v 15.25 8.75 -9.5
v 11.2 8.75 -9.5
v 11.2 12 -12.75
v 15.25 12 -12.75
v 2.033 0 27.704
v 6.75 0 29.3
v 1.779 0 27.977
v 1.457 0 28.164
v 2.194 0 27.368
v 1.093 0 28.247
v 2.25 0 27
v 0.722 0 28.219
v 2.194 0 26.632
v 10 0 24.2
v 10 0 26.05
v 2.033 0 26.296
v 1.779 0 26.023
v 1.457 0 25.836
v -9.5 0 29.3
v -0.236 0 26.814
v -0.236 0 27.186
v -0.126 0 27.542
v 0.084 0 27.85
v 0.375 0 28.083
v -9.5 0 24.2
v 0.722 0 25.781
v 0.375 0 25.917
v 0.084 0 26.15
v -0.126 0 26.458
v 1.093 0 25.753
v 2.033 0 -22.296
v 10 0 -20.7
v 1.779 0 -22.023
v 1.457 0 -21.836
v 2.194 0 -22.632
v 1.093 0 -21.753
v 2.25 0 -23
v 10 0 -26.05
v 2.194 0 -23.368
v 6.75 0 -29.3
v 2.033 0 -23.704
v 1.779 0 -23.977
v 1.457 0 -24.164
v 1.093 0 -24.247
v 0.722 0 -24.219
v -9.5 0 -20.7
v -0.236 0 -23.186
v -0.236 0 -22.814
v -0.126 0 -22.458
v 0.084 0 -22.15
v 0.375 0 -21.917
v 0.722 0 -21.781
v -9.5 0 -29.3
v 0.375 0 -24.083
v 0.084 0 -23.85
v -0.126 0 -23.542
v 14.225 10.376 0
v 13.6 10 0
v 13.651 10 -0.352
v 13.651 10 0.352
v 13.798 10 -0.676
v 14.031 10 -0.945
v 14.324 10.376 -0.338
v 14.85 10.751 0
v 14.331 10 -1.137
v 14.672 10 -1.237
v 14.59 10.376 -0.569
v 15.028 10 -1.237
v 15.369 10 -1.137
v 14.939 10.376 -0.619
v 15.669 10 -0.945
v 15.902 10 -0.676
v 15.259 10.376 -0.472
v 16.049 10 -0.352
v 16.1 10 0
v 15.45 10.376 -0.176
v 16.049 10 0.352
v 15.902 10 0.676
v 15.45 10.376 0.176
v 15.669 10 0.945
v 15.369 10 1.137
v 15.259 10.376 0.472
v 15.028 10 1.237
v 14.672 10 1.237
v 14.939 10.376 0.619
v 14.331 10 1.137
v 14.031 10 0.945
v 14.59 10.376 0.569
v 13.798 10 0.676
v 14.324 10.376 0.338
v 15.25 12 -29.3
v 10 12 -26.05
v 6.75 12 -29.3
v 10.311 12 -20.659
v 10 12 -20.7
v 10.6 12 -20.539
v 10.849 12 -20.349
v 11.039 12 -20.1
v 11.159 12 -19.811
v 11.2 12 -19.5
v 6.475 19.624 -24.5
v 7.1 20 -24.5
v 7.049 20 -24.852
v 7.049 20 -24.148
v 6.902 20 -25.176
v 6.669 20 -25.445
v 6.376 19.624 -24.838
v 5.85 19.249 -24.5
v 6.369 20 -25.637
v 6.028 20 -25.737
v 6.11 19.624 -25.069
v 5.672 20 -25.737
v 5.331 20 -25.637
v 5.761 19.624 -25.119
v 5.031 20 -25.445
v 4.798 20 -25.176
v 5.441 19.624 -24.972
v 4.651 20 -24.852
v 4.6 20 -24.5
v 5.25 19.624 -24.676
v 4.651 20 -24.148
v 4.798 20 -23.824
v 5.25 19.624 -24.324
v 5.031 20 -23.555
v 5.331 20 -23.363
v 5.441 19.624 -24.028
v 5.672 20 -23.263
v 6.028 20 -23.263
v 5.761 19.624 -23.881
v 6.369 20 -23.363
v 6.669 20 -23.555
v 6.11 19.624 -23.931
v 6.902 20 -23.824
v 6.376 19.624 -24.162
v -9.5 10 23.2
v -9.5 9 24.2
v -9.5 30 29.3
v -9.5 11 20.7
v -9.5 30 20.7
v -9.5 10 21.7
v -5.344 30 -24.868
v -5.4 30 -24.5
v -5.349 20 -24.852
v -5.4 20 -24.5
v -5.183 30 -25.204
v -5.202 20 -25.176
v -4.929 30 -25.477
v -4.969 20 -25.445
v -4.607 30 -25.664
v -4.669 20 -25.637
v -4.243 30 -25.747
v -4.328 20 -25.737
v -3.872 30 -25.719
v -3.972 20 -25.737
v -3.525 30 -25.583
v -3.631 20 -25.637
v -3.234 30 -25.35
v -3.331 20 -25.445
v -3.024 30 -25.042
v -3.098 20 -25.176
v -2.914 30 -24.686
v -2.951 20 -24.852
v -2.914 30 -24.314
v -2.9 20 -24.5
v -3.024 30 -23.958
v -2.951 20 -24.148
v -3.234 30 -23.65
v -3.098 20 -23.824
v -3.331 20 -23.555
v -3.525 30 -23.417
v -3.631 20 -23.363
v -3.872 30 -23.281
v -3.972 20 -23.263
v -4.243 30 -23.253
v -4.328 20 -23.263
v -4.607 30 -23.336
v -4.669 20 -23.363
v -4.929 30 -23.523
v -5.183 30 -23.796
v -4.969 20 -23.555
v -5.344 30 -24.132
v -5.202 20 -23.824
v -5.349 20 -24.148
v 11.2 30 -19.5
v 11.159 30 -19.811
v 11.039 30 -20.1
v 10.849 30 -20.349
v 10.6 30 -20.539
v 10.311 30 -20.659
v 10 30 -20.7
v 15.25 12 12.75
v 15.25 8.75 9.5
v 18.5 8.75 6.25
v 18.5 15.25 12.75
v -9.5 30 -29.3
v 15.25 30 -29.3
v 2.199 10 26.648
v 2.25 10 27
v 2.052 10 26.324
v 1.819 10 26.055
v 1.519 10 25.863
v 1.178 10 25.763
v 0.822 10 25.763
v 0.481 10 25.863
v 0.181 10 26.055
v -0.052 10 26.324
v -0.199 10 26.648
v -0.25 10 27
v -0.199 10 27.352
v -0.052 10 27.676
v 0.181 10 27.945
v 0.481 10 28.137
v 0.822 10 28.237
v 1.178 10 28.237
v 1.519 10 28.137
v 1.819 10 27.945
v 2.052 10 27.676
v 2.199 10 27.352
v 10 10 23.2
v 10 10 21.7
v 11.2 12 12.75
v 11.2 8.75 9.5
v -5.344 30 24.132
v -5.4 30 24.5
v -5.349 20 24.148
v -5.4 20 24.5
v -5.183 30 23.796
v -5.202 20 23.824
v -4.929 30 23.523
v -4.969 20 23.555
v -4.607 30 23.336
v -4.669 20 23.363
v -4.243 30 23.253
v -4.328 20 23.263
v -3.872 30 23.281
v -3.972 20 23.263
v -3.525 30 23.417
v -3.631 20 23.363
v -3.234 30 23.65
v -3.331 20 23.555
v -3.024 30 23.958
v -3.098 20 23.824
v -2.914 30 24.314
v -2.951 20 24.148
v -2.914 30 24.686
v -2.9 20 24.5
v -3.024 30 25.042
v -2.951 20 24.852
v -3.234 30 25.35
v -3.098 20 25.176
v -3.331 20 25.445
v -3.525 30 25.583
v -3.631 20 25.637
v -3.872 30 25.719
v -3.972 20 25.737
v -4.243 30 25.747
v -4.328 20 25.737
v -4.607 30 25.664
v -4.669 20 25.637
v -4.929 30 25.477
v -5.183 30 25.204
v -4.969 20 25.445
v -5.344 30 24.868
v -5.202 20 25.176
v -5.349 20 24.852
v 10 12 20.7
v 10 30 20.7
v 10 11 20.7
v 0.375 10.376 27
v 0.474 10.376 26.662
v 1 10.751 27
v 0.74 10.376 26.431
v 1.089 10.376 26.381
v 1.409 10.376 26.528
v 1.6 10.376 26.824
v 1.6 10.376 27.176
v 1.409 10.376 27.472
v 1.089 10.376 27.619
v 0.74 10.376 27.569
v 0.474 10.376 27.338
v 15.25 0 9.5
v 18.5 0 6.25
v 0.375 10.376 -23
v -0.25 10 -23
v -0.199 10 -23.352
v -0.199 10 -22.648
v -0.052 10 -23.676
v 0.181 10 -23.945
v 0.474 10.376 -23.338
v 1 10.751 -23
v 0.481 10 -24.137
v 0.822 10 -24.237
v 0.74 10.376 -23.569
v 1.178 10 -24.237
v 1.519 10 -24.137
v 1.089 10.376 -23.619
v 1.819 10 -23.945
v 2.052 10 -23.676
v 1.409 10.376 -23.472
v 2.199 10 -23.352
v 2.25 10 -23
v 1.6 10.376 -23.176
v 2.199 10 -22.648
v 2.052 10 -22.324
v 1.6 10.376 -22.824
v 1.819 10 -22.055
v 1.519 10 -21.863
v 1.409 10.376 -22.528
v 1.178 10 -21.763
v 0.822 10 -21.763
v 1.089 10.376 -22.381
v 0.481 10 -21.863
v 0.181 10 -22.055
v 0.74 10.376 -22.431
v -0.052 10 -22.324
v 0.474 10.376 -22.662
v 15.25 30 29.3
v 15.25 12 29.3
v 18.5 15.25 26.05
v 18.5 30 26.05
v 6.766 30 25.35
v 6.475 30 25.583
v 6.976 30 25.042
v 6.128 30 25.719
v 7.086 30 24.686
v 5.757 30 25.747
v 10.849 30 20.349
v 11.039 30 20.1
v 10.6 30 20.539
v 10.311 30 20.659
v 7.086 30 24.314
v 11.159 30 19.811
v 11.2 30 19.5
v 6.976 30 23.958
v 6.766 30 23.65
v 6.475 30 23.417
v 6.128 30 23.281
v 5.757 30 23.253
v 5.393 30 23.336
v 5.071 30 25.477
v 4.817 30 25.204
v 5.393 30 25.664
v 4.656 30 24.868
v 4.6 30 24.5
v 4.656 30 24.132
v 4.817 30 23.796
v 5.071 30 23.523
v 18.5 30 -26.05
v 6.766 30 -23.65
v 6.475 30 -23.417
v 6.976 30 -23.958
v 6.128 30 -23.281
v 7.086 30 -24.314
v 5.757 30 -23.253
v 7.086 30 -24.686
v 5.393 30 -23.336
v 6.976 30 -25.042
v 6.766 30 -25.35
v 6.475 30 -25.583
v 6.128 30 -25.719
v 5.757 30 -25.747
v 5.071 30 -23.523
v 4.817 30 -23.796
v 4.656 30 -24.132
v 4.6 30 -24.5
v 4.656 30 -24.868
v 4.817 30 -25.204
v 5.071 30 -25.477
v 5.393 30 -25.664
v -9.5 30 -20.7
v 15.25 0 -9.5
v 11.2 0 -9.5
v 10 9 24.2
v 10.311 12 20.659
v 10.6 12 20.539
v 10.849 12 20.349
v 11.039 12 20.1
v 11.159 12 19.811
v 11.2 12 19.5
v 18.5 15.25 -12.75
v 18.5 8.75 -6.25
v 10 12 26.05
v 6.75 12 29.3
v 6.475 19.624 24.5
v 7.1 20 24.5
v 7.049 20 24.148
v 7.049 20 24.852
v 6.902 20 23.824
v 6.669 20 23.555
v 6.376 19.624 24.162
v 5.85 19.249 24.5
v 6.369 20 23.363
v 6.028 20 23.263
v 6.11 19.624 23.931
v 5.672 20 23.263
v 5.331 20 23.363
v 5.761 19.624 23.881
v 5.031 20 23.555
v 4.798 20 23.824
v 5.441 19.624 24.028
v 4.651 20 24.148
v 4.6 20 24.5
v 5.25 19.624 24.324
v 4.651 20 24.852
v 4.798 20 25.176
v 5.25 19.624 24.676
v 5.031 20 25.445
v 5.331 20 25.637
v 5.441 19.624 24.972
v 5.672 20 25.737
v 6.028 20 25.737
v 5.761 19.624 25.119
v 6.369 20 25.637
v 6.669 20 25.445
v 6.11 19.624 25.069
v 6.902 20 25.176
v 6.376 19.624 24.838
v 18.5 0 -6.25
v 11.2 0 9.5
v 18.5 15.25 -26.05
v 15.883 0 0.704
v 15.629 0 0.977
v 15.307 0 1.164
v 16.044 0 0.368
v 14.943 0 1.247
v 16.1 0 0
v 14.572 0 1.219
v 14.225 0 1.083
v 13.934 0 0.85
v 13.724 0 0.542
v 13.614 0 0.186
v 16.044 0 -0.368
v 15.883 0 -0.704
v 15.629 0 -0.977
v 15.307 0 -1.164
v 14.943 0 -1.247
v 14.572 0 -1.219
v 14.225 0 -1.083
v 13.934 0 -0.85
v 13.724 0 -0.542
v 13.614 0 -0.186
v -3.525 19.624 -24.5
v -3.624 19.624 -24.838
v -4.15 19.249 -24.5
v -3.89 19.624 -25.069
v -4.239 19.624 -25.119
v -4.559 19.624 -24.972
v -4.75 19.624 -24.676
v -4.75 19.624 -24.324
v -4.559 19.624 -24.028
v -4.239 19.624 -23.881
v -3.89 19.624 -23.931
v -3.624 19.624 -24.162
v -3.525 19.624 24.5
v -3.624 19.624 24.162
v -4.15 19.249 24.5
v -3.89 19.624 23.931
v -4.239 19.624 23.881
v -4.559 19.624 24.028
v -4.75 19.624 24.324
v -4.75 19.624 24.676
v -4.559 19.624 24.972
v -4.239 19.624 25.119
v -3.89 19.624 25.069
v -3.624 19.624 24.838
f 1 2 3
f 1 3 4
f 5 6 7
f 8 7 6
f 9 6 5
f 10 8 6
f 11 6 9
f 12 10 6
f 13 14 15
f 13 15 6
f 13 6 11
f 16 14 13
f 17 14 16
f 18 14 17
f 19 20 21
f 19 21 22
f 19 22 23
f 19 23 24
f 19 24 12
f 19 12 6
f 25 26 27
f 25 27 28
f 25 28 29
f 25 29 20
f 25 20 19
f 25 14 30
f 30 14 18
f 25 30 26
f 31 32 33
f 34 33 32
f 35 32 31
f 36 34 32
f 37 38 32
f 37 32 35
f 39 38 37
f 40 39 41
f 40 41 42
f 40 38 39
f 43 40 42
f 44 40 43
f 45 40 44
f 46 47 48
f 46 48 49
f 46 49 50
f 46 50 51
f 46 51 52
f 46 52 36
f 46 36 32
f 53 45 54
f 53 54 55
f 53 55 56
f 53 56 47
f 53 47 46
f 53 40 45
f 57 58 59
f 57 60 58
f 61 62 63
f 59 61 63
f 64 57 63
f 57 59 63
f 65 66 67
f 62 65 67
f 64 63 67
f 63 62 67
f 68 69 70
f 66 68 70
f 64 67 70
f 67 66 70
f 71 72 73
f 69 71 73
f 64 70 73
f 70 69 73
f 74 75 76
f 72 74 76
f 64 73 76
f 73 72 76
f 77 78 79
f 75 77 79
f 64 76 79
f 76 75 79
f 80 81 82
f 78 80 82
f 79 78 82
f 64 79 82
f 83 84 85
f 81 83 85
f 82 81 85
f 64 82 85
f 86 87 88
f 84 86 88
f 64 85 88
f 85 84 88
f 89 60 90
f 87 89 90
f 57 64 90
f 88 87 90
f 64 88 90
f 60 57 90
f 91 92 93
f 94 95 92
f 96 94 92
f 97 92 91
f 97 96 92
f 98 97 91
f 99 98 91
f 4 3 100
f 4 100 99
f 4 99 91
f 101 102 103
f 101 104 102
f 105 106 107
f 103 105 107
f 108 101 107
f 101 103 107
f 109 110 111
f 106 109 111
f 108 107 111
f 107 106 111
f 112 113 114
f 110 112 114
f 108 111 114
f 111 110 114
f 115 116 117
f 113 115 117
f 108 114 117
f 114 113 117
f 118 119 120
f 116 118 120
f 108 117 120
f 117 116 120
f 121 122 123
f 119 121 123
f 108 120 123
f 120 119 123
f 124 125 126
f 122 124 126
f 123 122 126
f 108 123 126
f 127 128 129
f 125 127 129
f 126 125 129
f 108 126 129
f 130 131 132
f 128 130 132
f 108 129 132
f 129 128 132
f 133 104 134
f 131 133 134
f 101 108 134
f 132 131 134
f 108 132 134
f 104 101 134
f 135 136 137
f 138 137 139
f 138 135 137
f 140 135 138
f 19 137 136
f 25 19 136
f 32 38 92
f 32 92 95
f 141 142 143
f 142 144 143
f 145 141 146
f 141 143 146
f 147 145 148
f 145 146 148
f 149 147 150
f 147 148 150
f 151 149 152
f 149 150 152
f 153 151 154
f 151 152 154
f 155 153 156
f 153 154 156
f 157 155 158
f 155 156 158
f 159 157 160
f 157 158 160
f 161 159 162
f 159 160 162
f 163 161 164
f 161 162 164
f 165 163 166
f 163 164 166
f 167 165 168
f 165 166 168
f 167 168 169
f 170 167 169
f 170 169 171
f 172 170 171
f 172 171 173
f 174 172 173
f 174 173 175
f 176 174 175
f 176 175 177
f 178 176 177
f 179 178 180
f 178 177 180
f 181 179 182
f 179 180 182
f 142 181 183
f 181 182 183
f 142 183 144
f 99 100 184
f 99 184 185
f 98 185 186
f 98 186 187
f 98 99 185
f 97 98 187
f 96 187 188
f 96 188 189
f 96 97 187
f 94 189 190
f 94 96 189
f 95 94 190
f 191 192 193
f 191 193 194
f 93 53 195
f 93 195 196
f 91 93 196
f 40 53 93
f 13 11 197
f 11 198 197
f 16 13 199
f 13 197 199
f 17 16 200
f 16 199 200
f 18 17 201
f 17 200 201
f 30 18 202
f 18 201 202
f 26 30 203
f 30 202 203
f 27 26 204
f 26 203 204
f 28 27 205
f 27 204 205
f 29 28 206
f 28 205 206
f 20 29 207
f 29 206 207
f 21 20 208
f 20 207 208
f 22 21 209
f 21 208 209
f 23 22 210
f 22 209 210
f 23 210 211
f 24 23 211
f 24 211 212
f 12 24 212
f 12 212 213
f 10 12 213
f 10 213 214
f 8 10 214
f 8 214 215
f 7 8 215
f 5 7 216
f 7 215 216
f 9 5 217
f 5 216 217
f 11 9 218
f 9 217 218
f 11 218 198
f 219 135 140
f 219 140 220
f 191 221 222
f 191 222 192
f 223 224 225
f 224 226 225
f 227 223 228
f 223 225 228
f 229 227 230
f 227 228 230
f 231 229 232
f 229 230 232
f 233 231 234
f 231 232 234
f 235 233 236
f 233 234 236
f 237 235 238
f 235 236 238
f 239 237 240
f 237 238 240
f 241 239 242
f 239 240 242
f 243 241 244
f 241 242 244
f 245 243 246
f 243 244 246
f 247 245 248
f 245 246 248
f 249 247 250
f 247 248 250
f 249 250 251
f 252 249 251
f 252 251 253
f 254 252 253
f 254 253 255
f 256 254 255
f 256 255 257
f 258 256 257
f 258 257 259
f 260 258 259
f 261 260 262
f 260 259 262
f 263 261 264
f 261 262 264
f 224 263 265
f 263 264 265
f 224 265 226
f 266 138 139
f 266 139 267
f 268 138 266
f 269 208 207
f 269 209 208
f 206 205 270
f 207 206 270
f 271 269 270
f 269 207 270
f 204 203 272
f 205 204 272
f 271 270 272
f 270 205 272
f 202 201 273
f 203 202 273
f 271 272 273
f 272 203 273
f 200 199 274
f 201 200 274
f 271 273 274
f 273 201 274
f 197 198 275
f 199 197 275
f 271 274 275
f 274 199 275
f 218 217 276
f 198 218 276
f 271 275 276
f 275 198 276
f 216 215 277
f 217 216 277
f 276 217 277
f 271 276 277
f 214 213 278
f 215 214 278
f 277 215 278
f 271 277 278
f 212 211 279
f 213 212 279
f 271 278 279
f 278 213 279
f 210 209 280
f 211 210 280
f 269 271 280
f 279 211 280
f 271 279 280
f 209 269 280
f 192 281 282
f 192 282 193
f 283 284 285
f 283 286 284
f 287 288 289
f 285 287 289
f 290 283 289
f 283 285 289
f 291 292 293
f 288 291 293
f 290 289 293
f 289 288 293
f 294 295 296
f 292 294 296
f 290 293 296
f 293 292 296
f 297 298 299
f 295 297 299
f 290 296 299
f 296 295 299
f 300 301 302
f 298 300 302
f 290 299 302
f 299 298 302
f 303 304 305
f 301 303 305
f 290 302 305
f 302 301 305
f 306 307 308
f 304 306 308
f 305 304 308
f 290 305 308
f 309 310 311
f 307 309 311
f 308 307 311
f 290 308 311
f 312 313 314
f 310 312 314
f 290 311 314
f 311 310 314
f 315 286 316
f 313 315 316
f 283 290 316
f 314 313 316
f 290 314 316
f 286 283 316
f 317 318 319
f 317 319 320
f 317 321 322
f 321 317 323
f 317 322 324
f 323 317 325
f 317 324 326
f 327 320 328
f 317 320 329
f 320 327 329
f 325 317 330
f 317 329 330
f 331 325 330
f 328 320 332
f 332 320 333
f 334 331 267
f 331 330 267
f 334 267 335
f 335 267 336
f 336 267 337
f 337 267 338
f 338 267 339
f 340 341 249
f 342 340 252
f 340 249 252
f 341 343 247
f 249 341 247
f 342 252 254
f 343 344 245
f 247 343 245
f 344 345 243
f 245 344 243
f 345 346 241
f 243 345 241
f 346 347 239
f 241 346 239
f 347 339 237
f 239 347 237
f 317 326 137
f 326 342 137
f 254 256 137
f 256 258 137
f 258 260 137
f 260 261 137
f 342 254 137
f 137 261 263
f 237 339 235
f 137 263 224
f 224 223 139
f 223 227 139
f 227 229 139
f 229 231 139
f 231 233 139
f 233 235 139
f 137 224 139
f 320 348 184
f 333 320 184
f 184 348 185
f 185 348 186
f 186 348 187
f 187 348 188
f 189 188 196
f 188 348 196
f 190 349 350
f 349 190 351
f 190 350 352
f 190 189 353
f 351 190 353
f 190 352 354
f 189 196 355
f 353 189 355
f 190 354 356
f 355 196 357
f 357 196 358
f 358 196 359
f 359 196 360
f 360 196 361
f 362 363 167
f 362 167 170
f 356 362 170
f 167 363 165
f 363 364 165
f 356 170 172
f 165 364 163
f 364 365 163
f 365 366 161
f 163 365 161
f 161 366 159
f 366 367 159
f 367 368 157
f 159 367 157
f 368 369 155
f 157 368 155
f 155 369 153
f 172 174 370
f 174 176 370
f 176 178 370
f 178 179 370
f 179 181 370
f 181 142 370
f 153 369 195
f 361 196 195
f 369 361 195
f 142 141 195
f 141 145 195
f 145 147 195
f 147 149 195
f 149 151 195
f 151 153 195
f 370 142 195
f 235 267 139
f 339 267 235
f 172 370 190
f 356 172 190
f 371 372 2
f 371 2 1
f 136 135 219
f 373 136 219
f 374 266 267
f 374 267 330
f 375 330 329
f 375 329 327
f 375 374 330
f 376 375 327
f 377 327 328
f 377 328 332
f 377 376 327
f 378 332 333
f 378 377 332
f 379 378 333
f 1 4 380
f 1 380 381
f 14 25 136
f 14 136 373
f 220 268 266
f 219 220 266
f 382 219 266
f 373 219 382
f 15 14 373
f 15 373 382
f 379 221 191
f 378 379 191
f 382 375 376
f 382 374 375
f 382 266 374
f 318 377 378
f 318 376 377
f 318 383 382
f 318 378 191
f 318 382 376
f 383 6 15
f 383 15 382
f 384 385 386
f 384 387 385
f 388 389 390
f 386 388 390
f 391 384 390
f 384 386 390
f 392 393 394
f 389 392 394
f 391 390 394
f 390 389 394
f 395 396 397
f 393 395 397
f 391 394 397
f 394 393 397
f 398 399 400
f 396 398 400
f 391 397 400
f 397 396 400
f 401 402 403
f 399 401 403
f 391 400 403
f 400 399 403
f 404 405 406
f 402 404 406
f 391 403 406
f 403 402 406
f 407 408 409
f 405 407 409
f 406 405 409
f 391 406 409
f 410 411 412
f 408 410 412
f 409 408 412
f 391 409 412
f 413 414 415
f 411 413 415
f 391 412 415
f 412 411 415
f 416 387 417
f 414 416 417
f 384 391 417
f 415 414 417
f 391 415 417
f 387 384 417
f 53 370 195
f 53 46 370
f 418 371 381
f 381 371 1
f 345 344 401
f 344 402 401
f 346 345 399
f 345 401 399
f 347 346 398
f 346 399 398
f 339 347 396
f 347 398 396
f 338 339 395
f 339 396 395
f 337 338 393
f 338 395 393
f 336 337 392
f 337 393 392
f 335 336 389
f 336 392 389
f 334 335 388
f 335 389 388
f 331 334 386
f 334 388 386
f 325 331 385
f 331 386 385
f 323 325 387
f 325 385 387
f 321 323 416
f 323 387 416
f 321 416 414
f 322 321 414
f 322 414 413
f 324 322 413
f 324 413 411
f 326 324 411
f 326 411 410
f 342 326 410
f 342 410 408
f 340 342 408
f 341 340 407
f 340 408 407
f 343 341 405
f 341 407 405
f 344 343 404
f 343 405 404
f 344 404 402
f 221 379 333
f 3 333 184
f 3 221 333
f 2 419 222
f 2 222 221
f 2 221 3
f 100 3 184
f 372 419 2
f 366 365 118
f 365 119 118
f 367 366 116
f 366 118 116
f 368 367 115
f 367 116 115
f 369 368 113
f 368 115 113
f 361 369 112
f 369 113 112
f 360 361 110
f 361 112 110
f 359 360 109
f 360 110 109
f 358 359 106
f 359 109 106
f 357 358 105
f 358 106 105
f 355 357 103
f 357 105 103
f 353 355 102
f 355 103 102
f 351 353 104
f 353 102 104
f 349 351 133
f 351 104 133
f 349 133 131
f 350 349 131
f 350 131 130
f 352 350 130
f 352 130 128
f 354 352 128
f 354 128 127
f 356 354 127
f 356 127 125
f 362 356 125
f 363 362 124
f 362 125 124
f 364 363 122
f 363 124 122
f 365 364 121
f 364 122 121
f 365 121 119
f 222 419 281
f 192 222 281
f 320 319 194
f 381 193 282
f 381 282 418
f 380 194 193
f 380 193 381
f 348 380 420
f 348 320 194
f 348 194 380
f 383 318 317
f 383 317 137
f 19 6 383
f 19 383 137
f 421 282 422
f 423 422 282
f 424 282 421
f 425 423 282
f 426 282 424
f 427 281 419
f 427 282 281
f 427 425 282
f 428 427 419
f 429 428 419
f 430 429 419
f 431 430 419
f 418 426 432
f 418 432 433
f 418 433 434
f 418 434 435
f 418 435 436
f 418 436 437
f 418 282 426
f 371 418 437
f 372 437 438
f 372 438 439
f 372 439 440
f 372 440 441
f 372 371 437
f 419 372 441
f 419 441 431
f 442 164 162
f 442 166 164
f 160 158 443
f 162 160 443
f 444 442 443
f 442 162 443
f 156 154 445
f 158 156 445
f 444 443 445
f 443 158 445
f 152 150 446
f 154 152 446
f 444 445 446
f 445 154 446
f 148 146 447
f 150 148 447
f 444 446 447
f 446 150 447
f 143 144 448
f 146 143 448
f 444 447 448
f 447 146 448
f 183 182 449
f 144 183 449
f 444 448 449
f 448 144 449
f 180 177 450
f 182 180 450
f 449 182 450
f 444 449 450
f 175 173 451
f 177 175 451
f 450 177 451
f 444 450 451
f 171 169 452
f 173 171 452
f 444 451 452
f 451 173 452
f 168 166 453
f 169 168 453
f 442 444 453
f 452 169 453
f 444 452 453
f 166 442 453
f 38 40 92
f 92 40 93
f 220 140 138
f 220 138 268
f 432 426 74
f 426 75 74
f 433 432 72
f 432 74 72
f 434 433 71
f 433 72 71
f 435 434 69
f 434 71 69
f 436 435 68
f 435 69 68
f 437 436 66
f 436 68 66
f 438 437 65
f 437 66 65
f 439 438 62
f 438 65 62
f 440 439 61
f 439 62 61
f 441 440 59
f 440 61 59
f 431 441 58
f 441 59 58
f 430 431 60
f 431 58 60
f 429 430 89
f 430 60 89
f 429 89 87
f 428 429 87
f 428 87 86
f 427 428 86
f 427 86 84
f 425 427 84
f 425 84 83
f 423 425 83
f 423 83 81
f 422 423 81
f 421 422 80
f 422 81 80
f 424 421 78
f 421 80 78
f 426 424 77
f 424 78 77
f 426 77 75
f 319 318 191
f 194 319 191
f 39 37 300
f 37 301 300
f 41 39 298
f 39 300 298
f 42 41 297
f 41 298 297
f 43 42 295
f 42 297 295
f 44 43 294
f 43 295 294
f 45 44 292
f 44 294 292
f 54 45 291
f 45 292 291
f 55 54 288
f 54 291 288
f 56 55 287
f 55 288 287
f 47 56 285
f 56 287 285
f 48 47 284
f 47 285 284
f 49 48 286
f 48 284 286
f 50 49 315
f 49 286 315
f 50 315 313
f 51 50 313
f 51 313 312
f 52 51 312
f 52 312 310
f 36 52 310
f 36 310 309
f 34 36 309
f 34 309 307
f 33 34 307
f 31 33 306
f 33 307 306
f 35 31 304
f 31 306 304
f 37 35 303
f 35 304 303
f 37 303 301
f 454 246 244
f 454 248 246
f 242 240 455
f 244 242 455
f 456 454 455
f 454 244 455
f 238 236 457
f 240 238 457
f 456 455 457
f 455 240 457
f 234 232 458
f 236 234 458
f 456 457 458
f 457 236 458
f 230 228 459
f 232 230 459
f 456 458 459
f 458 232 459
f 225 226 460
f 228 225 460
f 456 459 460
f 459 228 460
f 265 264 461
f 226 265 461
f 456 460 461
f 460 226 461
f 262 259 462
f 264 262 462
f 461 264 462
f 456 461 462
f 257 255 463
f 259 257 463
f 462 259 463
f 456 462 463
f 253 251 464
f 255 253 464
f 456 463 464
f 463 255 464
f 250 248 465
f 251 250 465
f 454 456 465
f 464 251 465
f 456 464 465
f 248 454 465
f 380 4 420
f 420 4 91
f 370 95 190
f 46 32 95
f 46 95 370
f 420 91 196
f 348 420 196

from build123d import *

# Parameters (mm, degrees)
BOSS_EXTRU_1_DEPTH      = 30
ESQUISSE2_W             = 8.5
ESQUISSE2_H             = 19.8
ENL_V_MAT_EXTRU_1_DEPTH = 12
TROU_TARAUD_M31_D       = 2.5
TROU_TARAUD_M31_DEPTH   = 10
TROU_TARAUD_M31_TIP     = 0.751075774
ESQUISSE7_W             = 28
ESQUISSE7_H             = 8.3
BOSS_EXTRU_2_DEPTH      = 18
CHANFREIN3_SIZE         = 3.25
TROU_TARAUD_M32_D       = 2.5
TROU_TARAUD_M32_DEPTH   = 10
TROU_TARAUD_M32_TIP     = 0.751075774
ESQUISSE10_W            = 19.5
ESQUISSE10_H            = 3.5
ENL_V_MAT_EXTRU_2_DEPTH = 10
CHANFREIN4_SIZE         = 1


with BuildPart() as part:
    # Esquisse1 → Boss.-Extru.1 (new body)
    with BuildSketch(Plane(origin=(0, 0, 0), x_dir=(1, 0, 0), z_dir=(0, 1, 0))):
        with BuildLine():
            Line((-9.5, 20.7), (-9.5, 29.3))
            Line((-9.5, 29.3), (18.5, 29.3))
            Line((18.5, 29.3), (18.5, -29.3))
            Line((18.5, -29.3), (-9.5, -29.3))
            Line((-9.5, -29.3), (-9.5, -20.7))
            Line((-9.5, -20.7), (10, -20.7))
            ThreePointArc((10, -20.7), (10.848528137, -20.348528137), (11.2, -19.5))
            Line((11.2, -19.5), (11.2, 19.5))
            ThreePointArc((11.2, 19.5), (10.848528137, 20.348528137), (10, 20.7))
            Line((10, 20.7), (-9.5, 20.7))
        make_face()
    extrude(amount=BOSS_EXTRU_1_DEPTH)

    # Esquisse2 → Enlèv. mat.-Extru.1 (cut)
    with BuildSketch(Plane.XZ):
        with Locations((14.25, 19.4)):
            Rectangle(ESQUISSE2_W, ESQUISSE2_H)
        with Locations((14.25, -19.4)):
            Rectangle(ESQUISSE2_W, ESQUISSE2_H)
    extrude(amount=-ENL_V_MAT_EXTRU_1_DEPTH, mode=Mode.SUBTRACT)

    # Trou taraudé M31
    with Locations(Plane(origin=(0, 0, 0), x_dir=(-1, 0, 0), z_dir=(0, -1, 0))):
        with Locations((-1, 23), (-14.85, 0), (-1, -27)):
            Hole(TROU_TARAUD_M31_D / 2, depth=TROU_TARAUD_M31_DEPTH)
            with Locations((0, 0, -(TROU_TARAUD_M31_DEPTH + TROU_TARAUD_M31_TIP / 2))):  # 118° drill point
                Cone(0, TROU_TARAUD_M31_D / 2, TROU_TARAUD_M31_TIP, mode=Mode.SUBTRACT)

    # Esquisse7 → Boss.-Extru.2 (add)
    with BuildSketch(Plane(origin=(0, 30, 0), x_dir=(1, 0, 0), z_dir=(0, 1, 0))):
        with Locations((4.5, -24.85)):
            Rectangle(ESQUISSE7_W, ESQUISSE7_H)
        with Locations((4.5, 24.85)):
            Rectangle(ESQUISSE7_W, ESQUISSE7_H)
    extrude(amount=-BOSS_EXTRU_2_DEPTH)

    # Chanfrein3
    chanfrein3_edges = [part.edges().sort_by_distance(p)[0] for p in [
        (18.5, 21, -29.3),
        (18.5, 21, 29.3),
        (14.85, 12, 9.5),
        (18.5, 6, 9.5),
        (18.5, 12, 19.4),
        (10, 6, 29.3),
        (10, 6, -29.3),
        (14.85, 12, -9.5),
        (18.5, 12, -19.4),
        (18.5, 6, -9.5),
    ]]
    chamfer(chanfrein3_edges, length=CHANFREIN3_SIZE)

    # Trou taraudé M32
    with Locations(Plane(origin=(0, 30, 0), x_dir=(1, 0, 0), z_dir=(0, 1, 0))):
        with Locations((-4.15, 24.5), (-4.15, -24.5), (5.85, -24.5), (5.85, 24.5)):
            Hole(TROU_TARAUD_M32_D / 2, depth=TROU_TARAUD_M32_DEPTH)
            with Locations((0, 0, -(TROU_TARAUD_M32_DEPTH + TROU_TARAUD_M32_TIP / 2))):  # 118° drill point
                Cone(0, TROU_TARAUD_M32_D / 2, TROU_TARAUD_M32_TIP, mode=Mode.SUBTRACT)

    # Esquisse10 → Enlèv. mat.-Extru.2 (cut)
    with BuildSketch(Plane.XZ):
        with Locations((0.25, 22.45)):
            Rectangle(ESQUISSE10_W, ESQUISSE10_H)
    extrude(amount=-ENL_V_MAT_EXTRU_2_DEPTH, mode=Mode.SUBTRACT)

    # Chanfrein4
    chanfrein4_edges = [part.edges().sort_by_distance(p)[0] for p in [
        (0.25, 10, 24.2),
        (0.25, 10, 20.7),
    ]]
    chamfer(chanfrein4_edges, length=CHANFREIN4_SIZE)


solid = part.part
